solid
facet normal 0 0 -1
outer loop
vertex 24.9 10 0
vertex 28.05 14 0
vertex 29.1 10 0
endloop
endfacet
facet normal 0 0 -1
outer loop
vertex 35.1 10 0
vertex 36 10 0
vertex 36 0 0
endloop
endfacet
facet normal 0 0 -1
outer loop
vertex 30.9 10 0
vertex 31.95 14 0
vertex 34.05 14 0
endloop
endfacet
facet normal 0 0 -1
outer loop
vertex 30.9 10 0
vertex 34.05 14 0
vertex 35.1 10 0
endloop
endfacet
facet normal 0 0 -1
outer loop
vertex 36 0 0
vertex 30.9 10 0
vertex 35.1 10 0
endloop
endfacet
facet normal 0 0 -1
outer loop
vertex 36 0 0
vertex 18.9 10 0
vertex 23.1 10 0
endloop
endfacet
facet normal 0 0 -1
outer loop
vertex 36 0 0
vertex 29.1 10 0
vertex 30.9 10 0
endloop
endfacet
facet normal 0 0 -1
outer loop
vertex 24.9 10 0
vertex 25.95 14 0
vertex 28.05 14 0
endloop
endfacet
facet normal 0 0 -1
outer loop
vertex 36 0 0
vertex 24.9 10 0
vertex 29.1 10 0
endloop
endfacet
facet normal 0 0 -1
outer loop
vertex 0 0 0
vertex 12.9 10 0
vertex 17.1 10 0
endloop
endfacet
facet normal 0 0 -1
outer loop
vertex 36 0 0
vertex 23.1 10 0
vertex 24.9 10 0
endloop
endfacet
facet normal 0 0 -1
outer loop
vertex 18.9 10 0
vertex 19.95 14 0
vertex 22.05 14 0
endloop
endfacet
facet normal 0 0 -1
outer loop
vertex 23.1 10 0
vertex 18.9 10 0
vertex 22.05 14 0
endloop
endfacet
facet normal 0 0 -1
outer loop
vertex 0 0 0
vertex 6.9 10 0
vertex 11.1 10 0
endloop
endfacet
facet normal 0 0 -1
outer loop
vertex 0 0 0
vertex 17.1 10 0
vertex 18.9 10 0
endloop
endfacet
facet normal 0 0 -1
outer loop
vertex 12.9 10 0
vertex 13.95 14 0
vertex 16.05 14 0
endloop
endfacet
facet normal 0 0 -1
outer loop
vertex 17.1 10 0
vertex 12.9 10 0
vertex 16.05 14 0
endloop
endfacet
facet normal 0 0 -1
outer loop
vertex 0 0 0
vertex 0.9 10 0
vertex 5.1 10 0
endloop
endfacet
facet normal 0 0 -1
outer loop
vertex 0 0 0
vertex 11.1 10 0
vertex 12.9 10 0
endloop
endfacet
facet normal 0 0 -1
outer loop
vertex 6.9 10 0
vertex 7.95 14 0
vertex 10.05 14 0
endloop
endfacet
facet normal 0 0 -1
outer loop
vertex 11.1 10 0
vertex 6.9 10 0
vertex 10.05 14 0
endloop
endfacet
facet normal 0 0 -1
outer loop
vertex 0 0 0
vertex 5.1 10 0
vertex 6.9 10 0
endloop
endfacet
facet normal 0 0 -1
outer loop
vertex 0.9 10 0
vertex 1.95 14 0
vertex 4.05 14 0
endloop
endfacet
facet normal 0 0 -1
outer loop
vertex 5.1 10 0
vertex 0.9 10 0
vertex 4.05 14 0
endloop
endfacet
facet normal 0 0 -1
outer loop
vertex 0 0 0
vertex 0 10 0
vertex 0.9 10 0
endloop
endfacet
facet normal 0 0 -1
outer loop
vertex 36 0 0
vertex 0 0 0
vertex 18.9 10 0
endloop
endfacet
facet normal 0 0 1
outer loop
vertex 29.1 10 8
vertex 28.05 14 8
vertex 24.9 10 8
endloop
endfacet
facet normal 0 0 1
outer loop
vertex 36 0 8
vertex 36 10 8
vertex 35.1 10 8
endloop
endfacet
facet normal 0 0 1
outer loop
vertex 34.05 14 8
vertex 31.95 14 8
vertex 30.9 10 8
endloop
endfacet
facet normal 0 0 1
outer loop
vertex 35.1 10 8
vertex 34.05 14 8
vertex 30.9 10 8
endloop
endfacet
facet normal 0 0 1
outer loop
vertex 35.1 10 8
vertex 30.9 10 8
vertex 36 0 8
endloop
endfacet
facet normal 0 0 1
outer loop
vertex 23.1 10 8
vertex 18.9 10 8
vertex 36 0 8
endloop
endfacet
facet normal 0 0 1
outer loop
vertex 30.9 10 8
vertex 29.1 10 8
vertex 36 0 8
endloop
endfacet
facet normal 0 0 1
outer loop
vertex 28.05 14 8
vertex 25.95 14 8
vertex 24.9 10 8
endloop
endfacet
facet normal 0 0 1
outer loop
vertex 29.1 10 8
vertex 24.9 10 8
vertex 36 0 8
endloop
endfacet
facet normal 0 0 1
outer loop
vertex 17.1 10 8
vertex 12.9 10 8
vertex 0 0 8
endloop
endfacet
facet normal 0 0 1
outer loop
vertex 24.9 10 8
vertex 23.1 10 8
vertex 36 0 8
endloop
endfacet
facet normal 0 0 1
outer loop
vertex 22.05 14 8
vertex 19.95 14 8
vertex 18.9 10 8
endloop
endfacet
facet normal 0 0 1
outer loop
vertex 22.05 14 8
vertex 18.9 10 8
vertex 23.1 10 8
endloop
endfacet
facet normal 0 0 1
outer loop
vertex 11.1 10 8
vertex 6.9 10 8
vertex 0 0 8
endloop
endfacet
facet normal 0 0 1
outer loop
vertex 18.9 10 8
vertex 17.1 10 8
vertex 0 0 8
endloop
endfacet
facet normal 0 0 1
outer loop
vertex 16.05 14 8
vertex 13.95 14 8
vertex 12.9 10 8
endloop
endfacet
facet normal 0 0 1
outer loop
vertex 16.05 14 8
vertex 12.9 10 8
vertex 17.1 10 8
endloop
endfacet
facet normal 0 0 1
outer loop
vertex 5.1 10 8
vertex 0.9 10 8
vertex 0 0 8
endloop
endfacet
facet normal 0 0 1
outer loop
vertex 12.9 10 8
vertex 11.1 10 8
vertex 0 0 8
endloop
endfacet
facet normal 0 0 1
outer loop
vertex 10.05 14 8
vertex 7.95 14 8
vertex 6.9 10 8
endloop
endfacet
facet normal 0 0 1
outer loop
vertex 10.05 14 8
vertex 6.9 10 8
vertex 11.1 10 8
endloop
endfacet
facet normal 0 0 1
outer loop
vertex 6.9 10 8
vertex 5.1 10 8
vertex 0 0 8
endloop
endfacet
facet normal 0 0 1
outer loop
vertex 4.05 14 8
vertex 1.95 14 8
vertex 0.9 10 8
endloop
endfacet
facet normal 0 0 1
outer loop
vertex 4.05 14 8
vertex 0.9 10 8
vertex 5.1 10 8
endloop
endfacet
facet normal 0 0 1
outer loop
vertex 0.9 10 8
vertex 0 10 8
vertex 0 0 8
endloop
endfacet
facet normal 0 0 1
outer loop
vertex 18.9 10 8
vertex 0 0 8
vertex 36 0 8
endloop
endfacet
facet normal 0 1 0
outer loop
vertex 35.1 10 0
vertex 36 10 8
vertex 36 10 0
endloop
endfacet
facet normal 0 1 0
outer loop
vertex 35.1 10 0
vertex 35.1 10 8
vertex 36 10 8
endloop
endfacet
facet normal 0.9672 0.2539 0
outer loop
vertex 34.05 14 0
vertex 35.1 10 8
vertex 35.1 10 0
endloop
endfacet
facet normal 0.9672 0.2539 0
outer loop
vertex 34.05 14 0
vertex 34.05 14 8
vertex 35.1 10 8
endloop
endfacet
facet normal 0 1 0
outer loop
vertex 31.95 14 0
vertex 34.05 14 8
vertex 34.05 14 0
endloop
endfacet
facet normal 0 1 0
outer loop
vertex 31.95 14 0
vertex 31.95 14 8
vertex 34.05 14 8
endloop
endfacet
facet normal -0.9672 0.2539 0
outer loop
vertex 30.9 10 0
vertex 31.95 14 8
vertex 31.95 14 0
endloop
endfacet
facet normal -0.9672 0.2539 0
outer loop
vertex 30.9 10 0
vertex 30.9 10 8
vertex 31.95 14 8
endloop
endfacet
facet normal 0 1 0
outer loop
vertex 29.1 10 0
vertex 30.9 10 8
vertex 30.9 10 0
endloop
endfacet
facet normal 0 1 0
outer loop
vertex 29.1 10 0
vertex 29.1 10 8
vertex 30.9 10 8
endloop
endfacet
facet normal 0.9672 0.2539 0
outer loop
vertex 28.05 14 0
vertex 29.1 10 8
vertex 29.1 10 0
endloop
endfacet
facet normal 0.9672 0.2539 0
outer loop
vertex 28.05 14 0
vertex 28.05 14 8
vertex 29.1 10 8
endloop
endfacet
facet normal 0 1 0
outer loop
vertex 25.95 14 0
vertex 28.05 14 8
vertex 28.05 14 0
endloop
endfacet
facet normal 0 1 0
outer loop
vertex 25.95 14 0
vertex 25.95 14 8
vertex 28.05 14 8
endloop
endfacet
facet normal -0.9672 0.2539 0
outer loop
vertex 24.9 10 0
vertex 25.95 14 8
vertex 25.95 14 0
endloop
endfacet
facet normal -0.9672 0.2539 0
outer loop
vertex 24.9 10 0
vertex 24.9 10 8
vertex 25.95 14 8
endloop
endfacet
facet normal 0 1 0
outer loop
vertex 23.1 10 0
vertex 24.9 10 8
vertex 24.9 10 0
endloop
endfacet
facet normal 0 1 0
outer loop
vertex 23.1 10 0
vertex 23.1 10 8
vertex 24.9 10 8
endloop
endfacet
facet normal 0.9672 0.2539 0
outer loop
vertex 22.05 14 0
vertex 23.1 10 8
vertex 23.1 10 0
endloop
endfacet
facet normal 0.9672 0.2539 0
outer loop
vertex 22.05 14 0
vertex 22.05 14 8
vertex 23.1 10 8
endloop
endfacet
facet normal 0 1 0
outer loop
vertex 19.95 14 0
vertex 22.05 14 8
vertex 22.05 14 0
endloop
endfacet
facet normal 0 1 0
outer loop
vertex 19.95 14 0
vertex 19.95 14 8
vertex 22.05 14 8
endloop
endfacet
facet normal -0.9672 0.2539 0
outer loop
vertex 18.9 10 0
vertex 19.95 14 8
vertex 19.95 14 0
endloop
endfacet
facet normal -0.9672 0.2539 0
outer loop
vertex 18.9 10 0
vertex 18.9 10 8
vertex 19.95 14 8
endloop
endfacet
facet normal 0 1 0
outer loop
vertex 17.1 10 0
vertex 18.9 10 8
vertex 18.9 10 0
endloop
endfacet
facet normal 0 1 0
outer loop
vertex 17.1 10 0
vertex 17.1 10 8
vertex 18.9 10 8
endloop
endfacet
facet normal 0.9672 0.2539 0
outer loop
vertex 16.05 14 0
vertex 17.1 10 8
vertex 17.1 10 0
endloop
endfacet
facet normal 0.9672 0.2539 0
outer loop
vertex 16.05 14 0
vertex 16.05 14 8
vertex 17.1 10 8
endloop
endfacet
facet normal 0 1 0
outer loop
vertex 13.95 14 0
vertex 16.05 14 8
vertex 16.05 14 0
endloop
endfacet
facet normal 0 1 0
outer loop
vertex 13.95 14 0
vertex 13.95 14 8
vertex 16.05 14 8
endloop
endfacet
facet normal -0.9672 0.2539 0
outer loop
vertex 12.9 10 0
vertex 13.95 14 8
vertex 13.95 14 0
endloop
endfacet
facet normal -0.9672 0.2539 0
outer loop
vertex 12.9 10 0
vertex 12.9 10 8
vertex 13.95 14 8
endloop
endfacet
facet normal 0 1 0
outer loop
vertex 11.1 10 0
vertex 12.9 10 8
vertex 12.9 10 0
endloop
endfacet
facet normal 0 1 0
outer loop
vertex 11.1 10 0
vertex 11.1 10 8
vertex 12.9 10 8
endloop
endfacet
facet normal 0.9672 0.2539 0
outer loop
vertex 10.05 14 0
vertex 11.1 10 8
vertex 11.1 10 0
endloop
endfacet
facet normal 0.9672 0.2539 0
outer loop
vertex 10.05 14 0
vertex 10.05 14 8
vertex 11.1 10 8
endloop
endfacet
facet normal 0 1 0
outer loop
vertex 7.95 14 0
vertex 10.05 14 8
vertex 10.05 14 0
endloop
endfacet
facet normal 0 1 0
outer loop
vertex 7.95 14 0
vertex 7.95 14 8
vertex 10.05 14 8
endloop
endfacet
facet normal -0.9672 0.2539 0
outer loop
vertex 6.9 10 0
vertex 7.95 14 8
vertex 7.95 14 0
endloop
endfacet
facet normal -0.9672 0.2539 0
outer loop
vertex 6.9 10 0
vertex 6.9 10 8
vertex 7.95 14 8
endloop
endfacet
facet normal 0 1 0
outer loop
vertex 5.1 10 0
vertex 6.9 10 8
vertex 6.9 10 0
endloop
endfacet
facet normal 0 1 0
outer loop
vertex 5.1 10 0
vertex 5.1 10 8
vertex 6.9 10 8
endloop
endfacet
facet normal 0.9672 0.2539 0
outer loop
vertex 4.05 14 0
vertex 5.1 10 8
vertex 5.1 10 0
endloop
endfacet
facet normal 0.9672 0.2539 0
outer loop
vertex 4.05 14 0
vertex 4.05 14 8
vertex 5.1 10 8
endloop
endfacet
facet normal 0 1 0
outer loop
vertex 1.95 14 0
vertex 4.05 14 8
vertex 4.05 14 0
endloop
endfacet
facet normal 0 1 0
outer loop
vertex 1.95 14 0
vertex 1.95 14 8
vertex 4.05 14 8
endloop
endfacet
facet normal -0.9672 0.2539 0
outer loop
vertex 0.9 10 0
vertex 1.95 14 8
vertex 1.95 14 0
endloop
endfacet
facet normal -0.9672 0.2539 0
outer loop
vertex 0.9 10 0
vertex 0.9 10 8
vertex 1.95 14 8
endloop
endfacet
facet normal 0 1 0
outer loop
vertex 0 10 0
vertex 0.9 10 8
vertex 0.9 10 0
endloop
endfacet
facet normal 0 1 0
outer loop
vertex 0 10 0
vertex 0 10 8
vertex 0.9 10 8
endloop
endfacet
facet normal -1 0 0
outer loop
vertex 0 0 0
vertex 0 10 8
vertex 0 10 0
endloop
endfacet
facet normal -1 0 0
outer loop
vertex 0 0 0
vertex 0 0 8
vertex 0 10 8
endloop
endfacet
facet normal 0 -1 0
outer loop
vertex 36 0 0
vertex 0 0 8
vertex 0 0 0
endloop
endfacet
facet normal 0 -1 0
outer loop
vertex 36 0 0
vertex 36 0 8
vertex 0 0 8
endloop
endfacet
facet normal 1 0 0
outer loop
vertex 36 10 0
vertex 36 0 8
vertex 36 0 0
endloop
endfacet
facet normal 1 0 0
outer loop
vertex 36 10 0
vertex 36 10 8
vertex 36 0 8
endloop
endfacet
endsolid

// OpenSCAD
$fn = 32;

// ----------------------------------------------------------------------
// Gear rack: 6 teeth, pitch 6 mm
// ----------------------------------------------------------------------

// --- parameters (mm) ---
teeth = 6;                // number of teeth
pitch = 6;                // tooth pitch, X
root_w = 4.2;             // tooth width at the root
tip_w = 2.1;              // tooth width at the tip
base_h = 10;              // rack body height, Y
tooth_h = 4;              // tooth height above the body
plate_t = 8;              // rack width, Z (extrusion height)
fit_tol = 0.02;           // declared fit tolerance (prompt contract)
free_tol = 0.2;           // declared free tolerance (prompt contract)

rack_l = teeth * pitch;  // overall length
total_h = base_h + tooth_h;  // overall height

profile = [[0, 0], [36, 0], [36, 10], [35.1, 10], [34.05, 14], [31.95, 14], [30.9, 10], [29.1, 10], [28.05, 14], [25.95, 14], [24.9, 10], [23.1, 10], [22.05, 14], [19.95, 14], [18.9, 10], [17.1, 10], [16.05, 14], [13.95, 14], [12.9, 10], [11.1, 10], [10.05, 14], [7.95, 14], [6.9, 10], [5.1, 10], [4.05, 14], [1.95, 14], [0.9, 10], [0, 10]];  // primary outline, 28 points, counter clockwise

// --- the one profile operation ---
linear_extrude(height = plate_t) polygon(points = profile);
